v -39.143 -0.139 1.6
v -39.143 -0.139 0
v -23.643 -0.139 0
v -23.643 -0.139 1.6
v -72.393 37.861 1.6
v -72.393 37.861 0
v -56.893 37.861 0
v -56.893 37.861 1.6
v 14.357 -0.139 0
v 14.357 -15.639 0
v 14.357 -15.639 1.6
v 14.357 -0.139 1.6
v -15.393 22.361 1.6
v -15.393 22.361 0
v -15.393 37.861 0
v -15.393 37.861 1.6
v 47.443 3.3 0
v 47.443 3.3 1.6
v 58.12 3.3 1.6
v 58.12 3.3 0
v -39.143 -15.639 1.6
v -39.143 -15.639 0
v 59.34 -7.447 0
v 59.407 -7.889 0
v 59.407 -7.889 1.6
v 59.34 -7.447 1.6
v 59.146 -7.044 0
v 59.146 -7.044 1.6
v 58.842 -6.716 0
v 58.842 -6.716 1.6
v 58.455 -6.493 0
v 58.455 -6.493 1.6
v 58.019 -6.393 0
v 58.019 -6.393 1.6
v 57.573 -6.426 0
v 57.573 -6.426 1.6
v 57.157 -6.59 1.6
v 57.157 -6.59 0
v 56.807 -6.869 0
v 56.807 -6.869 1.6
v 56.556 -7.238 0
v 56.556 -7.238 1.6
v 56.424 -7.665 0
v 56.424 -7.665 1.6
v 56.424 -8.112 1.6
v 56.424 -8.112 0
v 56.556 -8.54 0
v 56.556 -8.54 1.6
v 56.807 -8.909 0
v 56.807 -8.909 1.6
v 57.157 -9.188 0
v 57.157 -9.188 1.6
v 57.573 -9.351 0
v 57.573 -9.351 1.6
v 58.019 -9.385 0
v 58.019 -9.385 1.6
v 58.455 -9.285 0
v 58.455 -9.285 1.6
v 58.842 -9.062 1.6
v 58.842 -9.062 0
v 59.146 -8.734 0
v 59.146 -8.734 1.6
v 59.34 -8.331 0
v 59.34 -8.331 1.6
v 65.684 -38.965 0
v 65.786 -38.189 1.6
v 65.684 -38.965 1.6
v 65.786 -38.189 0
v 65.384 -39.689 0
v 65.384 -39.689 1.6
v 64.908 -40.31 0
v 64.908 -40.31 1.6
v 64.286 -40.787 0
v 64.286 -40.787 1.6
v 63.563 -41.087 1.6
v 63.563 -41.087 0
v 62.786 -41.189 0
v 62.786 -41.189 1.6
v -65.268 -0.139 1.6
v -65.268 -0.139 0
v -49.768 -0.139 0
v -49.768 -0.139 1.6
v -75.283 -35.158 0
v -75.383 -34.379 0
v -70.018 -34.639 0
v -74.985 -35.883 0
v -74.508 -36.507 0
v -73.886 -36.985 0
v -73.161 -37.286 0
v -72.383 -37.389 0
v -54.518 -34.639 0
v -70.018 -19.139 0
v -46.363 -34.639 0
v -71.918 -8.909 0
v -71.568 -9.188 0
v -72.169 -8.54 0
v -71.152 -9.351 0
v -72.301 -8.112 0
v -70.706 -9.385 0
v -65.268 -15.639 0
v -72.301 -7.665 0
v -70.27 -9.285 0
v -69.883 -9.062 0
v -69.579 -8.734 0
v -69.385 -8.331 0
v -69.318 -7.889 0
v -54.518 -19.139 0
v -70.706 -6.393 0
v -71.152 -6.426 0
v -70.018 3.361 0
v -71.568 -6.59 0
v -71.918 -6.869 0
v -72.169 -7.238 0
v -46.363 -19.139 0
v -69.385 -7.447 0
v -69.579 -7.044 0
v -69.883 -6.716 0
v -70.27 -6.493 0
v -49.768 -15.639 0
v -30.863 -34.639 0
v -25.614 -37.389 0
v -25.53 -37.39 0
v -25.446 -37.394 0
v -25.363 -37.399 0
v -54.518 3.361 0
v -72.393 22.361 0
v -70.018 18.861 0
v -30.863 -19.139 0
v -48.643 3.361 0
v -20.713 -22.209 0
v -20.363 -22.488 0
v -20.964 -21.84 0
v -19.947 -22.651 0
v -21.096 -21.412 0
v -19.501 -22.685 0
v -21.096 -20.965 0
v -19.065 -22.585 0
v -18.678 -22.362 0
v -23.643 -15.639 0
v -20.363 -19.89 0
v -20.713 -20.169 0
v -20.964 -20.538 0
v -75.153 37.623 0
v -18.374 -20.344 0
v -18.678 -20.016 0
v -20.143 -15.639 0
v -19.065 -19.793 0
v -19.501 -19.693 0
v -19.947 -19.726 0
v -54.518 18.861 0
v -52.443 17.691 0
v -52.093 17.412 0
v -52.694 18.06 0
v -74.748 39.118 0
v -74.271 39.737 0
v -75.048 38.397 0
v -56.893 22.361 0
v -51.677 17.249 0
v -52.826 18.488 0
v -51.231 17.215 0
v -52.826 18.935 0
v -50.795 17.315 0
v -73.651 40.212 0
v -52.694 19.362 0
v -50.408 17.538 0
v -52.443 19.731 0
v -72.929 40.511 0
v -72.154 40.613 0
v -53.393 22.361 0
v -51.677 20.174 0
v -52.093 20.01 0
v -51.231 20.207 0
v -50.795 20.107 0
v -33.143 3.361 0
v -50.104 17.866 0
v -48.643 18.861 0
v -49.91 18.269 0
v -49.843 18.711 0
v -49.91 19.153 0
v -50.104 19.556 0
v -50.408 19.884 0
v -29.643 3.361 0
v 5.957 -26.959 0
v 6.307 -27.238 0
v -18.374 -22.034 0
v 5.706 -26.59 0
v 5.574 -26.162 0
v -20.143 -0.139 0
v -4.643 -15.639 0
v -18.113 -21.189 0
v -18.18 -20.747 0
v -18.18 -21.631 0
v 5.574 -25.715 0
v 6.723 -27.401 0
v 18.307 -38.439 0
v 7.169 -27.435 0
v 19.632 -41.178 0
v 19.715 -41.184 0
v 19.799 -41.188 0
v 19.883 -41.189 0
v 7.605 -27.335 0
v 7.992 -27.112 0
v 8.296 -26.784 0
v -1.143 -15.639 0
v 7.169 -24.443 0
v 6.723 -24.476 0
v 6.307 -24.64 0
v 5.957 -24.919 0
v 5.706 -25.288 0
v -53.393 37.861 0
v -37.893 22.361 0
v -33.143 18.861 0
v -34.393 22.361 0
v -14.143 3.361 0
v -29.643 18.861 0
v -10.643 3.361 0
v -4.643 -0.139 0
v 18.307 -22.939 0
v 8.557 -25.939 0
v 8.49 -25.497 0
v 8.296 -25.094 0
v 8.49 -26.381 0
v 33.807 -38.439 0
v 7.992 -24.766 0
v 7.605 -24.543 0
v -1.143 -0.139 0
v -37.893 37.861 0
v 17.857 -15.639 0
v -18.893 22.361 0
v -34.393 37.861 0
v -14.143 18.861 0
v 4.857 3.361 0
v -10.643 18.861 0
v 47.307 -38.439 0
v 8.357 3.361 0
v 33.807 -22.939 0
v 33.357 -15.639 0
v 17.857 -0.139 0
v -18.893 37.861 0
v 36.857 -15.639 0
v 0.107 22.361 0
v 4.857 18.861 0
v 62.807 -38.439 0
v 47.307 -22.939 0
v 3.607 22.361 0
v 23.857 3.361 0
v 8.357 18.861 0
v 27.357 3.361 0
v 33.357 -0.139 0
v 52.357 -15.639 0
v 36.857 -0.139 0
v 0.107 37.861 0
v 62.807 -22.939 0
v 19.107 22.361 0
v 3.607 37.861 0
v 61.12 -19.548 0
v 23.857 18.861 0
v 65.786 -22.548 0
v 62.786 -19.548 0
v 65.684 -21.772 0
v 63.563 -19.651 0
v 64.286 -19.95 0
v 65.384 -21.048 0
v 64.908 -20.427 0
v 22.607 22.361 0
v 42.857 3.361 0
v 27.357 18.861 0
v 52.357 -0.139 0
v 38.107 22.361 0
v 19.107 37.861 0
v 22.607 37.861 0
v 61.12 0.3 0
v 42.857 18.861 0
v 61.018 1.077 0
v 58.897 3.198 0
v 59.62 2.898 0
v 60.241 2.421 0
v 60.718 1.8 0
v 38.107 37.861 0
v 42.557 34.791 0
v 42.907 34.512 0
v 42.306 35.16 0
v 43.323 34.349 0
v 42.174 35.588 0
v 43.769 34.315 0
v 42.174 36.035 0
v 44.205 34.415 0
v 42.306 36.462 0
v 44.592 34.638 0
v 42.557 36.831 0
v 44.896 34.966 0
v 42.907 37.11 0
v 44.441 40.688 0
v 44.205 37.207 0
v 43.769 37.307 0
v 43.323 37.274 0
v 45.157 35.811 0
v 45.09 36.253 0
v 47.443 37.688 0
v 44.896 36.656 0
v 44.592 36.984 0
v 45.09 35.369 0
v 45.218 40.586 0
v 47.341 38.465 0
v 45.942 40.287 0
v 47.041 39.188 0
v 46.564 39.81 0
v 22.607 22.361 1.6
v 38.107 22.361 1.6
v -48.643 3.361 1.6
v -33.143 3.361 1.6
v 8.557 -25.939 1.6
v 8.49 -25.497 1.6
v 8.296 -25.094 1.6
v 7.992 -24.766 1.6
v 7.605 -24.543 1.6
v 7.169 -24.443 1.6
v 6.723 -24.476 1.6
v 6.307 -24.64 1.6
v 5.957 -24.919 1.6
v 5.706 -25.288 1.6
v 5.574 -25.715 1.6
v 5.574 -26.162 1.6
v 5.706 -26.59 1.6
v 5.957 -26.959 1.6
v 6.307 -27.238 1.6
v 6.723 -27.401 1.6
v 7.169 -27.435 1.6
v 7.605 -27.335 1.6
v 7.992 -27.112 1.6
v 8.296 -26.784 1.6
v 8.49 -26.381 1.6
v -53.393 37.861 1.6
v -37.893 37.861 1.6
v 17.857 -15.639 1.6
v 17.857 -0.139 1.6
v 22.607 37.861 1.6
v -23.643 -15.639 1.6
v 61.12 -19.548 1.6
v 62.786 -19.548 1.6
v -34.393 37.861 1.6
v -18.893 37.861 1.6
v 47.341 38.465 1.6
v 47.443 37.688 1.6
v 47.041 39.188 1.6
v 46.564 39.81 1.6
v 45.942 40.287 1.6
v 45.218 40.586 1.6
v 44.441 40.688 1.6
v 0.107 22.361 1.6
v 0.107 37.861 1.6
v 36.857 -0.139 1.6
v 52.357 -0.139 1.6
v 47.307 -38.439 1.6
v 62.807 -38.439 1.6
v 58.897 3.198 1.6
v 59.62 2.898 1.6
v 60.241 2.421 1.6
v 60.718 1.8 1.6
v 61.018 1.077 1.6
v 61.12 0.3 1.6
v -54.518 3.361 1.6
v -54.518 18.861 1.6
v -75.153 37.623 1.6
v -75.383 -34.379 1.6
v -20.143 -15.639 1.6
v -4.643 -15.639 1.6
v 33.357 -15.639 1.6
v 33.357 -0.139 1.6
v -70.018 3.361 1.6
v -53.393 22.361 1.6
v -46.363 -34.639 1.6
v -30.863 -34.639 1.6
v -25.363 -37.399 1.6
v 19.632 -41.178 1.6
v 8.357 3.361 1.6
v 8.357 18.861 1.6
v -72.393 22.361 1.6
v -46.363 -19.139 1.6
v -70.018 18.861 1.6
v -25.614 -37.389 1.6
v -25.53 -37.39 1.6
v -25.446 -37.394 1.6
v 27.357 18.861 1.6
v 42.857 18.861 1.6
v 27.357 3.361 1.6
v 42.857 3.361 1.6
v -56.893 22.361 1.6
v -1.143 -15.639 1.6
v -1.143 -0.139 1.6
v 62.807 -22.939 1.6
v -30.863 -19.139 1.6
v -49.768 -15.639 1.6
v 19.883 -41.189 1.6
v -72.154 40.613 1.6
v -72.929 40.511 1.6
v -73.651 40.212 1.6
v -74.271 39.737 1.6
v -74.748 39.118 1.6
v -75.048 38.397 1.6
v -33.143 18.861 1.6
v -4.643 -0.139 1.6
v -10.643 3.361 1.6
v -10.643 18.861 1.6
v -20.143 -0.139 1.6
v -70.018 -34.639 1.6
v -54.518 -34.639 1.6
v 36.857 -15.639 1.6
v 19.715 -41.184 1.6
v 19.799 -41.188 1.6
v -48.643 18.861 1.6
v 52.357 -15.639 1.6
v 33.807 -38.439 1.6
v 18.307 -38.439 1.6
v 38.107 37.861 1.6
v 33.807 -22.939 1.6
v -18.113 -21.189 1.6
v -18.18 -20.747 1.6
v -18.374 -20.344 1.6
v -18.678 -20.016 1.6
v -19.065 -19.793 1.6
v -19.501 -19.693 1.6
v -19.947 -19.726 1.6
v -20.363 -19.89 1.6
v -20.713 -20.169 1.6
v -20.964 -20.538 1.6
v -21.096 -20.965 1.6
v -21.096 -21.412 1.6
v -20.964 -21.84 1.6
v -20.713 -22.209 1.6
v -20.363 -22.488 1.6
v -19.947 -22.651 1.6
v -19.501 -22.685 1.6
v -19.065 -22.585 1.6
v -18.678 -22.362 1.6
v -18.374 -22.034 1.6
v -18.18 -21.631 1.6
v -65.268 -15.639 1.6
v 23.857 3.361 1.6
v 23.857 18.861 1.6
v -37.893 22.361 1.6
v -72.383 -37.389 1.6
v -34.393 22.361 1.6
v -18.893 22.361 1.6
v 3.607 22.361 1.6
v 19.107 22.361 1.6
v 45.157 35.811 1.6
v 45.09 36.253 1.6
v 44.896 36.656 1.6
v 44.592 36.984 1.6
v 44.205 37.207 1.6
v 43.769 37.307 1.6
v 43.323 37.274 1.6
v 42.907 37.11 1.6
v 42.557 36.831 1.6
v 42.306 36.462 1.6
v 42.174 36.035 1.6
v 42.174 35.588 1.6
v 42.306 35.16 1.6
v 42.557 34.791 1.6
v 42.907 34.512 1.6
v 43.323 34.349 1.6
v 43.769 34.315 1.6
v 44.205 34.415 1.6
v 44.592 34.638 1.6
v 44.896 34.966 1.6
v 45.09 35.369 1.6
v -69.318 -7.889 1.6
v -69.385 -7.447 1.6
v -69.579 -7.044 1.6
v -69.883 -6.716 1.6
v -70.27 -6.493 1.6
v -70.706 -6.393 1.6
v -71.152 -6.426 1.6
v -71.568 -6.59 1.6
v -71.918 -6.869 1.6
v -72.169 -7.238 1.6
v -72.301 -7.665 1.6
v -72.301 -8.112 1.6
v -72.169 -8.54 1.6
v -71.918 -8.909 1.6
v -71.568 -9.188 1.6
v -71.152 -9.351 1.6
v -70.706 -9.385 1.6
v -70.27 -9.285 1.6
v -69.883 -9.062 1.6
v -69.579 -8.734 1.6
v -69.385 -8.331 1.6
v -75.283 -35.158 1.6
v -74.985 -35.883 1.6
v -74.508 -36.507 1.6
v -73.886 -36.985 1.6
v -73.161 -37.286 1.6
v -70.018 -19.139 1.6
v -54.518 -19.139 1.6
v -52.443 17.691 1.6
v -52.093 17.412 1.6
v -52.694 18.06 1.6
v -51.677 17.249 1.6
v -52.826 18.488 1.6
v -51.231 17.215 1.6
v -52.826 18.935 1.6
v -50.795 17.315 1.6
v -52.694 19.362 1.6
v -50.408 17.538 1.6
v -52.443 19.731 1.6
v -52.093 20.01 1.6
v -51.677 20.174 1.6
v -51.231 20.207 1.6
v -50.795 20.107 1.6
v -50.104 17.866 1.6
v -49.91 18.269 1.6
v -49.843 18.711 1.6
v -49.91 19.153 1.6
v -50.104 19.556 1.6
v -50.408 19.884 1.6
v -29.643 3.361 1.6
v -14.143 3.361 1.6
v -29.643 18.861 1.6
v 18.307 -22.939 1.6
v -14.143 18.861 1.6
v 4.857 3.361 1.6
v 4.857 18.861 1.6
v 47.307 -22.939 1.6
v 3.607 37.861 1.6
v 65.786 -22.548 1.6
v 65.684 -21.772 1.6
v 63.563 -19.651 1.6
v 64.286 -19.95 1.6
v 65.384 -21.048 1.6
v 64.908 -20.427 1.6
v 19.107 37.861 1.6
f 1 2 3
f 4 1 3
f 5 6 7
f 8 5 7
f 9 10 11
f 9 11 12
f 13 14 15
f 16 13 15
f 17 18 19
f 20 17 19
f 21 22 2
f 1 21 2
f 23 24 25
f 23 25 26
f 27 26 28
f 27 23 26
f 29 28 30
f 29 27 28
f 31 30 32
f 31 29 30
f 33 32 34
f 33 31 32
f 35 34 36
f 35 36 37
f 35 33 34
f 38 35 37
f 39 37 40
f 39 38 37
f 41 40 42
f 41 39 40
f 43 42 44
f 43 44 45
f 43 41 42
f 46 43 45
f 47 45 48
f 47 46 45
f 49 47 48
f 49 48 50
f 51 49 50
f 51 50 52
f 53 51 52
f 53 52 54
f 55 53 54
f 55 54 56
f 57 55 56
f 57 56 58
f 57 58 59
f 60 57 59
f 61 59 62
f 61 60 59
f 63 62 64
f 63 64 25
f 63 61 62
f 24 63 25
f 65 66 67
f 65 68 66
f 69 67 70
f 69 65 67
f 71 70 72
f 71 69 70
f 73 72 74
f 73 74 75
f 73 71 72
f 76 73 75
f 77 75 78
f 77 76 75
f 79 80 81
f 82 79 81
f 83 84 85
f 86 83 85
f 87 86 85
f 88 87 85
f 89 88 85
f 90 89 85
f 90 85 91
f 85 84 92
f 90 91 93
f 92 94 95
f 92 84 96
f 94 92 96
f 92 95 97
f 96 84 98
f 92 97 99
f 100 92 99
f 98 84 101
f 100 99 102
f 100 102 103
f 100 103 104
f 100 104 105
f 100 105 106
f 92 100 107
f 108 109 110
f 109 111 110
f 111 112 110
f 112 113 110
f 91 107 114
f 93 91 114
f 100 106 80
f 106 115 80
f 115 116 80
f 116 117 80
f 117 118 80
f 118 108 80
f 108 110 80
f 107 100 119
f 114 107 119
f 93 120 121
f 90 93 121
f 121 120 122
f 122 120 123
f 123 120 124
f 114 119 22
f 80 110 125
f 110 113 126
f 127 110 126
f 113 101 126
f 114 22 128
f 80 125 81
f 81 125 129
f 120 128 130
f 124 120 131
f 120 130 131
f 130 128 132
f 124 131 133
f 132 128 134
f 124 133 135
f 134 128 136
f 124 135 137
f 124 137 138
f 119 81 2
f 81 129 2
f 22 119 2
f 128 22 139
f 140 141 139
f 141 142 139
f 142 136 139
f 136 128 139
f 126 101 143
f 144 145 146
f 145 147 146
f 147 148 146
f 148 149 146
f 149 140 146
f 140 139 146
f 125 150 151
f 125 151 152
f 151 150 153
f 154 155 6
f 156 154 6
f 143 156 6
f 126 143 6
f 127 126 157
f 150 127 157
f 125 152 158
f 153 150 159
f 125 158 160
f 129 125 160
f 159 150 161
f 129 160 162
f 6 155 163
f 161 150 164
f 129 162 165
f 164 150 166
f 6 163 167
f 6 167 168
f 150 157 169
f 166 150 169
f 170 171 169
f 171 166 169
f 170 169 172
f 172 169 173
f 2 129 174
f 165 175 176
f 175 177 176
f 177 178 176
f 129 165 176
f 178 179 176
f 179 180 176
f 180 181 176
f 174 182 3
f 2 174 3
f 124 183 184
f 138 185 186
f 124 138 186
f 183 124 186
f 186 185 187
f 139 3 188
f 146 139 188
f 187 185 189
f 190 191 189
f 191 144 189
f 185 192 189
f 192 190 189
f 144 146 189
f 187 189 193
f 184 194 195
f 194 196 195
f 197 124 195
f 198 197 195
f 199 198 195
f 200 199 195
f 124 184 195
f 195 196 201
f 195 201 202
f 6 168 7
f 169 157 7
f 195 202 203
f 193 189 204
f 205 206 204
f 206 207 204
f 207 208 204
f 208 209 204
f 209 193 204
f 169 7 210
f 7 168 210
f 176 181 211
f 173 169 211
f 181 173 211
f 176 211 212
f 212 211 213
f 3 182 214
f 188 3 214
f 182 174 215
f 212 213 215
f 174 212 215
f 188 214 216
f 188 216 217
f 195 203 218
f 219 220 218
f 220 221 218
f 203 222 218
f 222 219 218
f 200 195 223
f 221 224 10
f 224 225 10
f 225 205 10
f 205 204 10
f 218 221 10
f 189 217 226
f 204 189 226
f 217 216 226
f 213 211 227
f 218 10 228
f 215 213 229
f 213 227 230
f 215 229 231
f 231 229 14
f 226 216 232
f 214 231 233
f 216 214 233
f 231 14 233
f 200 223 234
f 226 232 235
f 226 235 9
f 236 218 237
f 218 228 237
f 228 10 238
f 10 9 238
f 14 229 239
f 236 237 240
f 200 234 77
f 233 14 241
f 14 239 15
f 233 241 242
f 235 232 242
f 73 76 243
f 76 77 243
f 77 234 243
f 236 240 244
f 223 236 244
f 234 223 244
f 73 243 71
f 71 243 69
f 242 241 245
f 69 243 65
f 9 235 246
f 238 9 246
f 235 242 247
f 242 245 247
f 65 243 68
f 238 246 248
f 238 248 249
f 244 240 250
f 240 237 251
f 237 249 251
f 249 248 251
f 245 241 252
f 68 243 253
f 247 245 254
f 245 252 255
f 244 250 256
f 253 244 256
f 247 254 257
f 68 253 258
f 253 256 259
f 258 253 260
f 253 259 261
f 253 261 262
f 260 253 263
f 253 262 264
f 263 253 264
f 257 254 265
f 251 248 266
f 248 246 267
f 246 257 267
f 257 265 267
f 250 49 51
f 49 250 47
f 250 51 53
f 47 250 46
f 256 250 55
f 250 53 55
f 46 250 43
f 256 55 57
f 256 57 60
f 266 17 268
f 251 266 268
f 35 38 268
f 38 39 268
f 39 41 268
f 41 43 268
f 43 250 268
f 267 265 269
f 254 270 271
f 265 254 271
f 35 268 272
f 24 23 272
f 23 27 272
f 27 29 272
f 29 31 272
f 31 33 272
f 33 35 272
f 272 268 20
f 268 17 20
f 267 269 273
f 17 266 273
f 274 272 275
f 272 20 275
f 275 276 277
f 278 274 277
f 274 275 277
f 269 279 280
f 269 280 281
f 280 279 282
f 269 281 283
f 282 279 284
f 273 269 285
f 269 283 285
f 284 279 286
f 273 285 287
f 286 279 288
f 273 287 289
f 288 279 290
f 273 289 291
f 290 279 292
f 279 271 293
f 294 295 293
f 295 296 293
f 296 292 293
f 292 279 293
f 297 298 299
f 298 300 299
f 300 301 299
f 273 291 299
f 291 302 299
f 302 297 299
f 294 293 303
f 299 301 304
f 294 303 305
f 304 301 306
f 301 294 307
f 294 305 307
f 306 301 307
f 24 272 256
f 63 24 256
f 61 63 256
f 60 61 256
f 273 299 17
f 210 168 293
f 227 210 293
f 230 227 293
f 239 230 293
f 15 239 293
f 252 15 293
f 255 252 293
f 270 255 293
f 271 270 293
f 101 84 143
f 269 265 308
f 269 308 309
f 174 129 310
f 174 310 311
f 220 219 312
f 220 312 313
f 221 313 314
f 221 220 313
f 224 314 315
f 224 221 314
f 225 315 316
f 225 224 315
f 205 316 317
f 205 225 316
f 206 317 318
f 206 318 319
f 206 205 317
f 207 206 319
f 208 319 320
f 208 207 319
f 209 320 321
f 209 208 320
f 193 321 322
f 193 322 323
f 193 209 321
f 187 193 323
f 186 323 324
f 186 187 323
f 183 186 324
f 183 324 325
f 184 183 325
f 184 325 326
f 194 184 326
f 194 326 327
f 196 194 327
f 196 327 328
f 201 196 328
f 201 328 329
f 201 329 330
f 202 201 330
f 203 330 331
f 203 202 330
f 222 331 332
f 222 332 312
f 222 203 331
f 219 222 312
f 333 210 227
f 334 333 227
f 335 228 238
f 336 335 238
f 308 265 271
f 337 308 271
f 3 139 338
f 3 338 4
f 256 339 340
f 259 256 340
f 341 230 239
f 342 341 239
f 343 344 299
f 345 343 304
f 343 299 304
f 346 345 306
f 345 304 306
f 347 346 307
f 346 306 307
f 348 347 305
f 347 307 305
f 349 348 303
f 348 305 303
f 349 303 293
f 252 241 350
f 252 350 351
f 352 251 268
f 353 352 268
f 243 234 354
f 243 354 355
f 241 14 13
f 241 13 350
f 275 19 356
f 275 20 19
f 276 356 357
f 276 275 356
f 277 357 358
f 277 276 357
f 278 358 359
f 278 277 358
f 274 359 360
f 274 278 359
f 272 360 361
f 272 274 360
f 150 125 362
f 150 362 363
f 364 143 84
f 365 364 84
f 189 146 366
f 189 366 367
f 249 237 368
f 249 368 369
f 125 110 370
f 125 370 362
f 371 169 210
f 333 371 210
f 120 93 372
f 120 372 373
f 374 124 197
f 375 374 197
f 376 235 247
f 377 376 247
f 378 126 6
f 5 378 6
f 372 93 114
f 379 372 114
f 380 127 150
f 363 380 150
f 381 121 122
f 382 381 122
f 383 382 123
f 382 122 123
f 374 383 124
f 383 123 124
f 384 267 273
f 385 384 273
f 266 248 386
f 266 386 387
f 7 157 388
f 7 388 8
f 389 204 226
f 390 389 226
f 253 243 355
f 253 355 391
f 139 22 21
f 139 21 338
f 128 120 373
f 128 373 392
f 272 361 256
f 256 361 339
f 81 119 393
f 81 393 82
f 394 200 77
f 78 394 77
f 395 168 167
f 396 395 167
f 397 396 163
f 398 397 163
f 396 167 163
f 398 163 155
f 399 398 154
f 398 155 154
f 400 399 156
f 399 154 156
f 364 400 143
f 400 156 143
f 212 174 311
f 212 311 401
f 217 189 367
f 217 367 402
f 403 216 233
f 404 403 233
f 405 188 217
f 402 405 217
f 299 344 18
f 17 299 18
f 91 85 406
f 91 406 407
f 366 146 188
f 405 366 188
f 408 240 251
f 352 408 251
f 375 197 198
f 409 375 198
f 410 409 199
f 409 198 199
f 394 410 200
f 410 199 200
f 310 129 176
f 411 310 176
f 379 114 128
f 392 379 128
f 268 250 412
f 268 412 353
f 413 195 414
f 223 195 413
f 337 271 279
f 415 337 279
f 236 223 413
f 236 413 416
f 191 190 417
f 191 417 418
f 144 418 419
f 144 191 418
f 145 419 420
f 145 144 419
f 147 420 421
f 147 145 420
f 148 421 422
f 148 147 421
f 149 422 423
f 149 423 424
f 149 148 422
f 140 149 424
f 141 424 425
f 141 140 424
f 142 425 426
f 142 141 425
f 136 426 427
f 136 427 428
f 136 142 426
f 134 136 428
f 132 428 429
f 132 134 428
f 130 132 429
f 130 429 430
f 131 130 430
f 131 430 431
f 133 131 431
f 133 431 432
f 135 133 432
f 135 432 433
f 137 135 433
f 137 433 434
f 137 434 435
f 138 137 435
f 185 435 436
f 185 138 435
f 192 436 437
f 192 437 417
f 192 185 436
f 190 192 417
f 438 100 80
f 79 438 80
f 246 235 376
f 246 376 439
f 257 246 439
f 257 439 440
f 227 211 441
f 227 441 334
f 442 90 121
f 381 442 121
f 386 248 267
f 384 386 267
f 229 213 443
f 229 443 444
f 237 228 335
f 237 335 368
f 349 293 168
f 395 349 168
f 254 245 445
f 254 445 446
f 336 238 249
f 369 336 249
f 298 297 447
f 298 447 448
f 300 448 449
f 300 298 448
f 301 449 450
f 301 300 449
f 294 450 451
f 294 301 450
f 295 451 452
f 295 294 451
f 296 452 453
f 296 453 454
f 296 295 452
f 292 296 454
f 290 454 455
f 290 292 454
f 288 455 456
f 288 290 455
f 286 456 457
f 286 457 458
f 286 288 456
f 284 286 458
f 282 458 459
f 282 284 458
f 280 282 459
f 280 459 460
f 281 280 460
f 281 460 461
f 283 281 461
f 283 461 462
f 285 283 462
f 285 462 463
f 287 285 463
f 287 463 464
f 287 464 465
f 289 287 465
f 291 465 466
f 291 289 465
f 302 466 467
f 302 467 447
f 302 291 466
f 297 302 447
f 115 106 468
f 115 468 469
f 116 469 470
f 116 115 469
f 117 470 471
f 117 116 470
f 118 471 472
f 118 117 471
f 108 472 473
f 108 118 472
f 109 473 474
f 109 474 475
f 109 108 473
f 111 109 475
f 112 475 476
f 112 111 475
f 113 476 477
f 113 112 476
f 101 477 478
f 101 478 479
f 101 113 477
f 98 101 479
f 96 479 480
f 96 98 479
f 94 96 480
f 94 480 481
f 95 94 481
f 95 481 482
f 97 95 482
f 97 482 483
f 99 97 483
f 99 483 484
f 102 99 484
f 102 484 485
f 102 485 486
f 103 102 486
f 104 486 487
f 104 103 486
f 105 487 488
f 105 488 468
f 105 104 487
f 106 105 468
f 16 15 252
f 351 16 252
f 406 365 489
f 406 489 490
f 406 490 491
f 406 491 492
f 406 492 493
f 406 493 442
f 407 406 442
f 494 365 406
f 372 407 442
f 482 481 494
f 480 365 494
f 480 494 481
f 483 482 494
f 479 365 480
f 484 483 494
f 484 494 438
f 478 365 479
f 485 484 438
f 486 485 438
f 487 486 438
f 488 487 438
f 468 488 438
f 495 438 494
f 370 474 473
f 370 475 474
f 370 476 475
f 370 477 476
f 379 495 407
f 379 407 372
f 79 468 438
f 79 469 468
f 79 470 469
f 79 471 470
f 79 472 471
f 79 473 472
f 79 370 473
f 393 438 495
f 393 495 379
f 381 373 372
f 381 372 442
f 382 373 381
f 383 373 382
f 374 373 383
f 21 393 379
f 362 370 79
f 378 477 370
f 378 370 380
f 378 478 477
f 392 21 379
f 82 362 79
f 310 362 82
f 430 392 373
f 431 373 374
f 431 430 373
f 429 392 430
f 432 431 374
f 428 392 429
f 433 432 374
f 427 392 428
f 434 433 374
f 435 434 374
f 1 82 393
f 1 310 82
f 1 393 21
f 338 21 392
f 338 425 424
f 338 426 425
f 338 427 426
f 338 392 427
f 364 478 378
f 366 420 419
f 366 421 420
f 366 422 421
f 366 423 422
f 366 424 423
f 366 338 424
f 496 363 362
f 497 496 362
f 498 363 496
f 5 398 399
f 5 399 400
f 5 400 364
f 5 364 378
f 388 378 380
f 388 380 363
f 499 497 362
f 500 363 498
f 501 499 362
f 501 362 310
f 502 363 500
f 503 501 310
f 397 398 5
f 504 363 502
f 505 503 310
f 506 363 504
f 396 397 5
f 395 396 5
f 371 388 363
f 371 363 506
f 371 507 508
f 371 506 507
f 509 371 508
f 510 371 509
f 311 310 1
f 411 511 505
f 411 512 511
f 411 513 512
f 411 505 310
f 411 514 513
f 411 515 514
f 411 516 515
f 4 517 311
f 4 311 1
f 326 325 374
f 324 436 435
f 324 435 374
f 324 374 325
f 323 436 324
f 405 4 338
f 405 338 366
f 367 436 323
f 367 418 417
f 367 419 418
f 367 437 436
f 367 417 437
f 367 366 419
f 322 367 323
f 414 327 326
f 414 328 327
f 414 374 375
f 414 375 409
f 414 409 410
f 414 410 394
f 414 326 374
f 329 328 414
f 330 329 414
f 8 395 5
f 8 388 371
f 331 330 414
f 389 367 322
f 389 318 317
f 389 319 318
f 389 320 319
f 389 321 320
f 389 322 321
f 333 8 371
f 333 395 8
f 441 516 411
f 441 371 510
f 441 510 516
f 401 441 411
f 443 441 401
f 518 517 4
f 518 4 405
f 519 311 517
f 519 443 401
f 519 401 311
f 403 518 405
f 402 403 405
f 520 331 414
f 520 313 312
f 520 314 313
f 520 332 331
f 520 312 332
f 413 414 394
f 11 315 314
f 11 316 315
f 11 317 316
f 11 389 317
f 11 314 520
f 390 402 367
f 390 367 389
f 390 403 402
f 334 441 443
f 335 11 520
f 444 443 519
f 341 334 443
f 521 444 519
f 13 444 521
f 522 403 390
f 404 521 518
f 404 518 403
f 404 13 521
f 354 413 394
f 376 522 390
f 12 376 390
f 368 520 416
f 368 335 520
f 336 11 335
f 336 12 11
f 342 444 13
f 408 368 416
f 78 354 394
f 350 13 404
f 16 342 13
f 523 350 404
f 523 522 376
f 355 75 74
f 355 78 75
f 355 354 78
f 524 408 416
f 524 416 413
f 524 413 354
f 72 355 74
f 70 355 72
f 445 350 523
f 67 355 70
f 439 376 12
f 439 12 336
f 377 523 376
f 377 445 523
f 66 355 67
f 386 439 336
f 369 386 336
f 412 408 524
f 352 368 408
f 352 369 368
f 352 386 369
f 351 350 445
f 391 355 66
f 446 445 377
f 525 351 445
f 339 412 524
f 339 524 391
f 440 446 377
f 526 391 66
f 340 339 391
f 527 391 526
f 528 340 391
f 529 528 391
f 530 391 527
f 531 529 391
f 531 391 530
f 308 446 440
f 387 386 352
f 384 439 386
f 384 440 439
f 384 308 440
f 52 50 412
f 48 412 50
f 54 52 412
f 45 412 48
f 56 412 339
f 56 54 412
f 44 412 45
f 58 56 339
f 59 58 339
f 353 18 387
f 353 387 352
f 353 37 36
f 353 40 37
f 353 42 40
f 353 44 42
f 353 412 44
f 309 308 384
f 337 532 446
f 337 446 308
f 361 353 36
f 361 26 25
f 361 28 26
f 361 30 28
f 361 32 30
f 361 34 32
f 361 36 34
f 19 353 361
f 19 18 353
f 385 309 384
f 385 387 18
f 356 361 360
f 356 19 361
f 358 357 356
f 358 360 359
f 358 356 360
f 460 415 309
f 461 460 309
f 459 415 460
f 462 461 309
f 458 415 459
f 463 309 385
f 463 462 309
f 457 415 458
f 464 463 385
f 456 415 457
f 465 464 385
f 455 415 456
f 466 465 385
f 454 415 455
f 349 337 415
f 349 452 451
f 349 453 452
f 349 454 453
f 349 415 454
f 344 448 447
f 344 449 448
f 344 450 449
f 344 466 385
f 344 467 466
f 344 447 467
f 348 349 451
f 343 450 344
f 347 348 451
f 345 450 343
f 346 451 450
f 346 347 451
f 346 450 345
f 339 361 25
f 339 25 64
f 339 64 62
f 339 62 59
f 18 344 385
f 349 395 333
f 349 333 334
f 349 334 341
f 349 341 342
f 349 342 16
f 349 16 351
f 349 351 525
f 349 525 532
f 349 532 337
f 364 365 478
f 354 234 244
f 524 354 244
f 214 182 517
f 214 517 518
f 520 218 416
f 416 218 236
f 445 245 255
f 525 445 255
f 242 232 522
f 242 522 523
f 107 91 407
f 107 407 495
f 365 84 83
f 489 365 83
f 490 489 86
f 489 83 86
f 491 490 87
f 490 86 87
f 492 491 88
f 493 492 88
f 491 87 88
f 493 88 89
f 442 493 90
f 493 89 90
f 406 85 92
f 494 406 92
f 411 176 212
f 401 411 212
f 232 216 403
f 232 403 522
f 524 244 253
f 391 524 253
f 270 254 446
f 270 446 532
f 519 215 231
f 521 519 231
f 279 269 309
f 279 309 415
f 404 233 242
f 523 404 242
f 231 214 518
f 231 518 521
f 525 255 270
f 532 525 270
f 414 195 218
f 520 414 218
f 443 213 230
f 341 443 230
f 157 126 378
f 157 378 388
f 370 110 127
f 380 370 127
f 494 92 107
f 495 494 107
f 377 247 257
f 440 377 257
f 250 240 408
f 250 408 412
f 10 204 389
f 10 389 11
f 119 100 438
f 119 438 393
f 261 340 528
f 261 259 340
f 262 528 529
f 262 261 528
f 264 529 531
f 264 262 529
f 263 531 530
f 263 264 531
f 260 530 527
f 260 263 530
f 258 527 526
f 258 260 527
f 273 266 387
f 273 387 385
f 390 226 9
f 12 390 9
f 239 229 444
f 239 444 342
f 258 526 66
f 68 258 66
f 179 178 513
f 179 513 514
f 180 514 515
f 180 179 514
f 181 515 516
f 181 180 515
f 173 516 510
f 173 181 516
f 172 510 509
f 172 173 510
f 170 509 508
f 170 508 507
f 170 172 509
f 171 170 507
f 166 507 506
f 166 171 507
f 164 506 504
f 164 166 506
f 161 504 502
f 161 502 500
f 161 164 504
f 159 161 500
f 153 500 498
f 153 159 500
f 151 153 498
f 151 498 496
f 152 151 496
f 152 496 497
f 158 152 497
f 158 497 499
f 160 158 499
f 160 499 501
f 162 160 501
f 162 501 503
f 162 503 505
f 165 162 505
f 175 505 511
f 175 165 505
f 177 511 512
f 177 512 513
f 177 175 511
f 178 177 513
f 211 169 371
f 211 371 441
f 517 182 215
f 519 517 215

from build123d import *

# Parameters (mm, degrees)
SKETCH1_R           = 1.5
SKETCH1_W           = 15.5
SKETCH1_H           = 15.5
BOSS_EXTRUDE1_DEPTH = 1.6
CUT_EXTRUDE2_DEPTH  = 91.713045172
FILLET2_R           = 3
FILLET3_R           = 3


with BuildPart() as part:
    # Sketch1 → Boss-Extrude1 (new body)
    with BuildSketch(Plane.XY):
        with BuildLine():
            Line((80.807032999, -9.202000204), (80.807032999, 37.709242496))
            ThreePointArc((80.807032999, 37.709242496), (79.927673142, 39.831242844), (77.805109389, 40.709241907))
            Line((77.805109389, 40.709241907), (-72.154484411, 40.613083107))
            ThreePointArc((-72.154484411, 40.613083107), (-74.271159988, 39.737121752), (-75.152545414, 37.622699011))
            Line((-75.152545414, 37.622699011), (-75.383320814, -34.379217889))
            ThreePointArc((-75.383320814, -34.379217889), (-74.508053368, -36.506751286), (-72.383336219, -37.388833194))
            Line((-72.383336219, -37.388833194), (-25.613726719, -37.388833194))
            ThreePointArc((-25.613726719, -37.388833194), (-25.488077715, -37.391465627), (-25.362649219, -37.399358309))
            Line((-25.362649219, -37.399358309), (19.631715181, -41.178308109))
            ThreePointArc((19.631715181, -41.178308109), (19.757143676, -41.18620079), (19.88279268, -41.188833223))
            Line((19.88279268, -41.188833223), (68.14475528, -41.188833223))
            ThreePointArc((68.14475528, -41.188833223), (69.898886106, -40.622559803), (70.990805162, -39.137516598))
            Line((70.990805162, -39.137516598), (80.653082862, -10.150683598))
            ThreePointArc((80.653082862, -10.150683598), (80.768295364, -9.682546983), (80.807032999, -9.202000204))
        make_face()
        with Locations((-19.612967014, -21.188833189)):
            Circle(SKETCH1_R, mode=Mode.SUBTRACT)
        with Locations((7.057032986, -25.938833189)):
            Circle(SKETCH1_R, mode=Mode.SUBTRACT)
        with Locations((43.657032986, 35.811166811)):
            Circle(SKETCH1_R, mode=Mode.SUBTRACT)
        with Locations((-70.817967014, -7.888833189)):
            Circle(SKETCH1_R, mode=Mode.SUBTRACT)
        with Locations((57.907032986, -7.888833189)):
            Circle(SKETCH1_R, mode=Mode.SUBTRACT)
        with Locations((-51.342967014, 18.711166811)):
            Circle(SKETCH1_R, mode=Mode.SUBTRACT)
        with Locations((-64.642967014, 30.111166811)):
            Rectangle(SKETCH1_W, SKETCH1_H, mode=Mode.SUBTRACT)
        with Locations((-45.642967014, 30.111166811)):
            Rectangle(SKETCH1_W, SKETCH1_H, mode=Mode.SUBTRACT)
        with Locations((-26.642967014, 30.111166811)):
            Rectangle(SKETCH1_W, SKETCH1_H, mode=Mode.SUBTRACT)
        with Locations((-7.642967014, 30.111166811)):
            Rectangle(SKETCH1_W, SKETCH1_H, mode=Mode.SUBTRACT)
        with Locations((11.357032986, 30.111166811)):
            Rectangle(SKETCH1_W, SKETCH1_H, mode=Mode.SUBTRACT)
        with Locations((30.357032986, 30.111166811)):
            Rectangle(SKETCH1_W, SKETCH1_H, mode=Mode.SUBTRACT)
        with Locations((-62.267967014, 11.111166811)):
            Rectangle(SKETCH1_W, SKETCH1_H, mode=Mode.SUBTRACT)
        with Locations((-40.892967014, 11.111166811)):
            Rectangle(SKETCH1_W, SKETCH1_H, mode=Mode.SUBTRACT)
        with Locations((-21.892967014, 11.111166811)):
            Rectangle(SKETCH1_W, SKETCH1_H, mode=Mode.SUBTRACT)
        with Locations((-2.892967014, 11.111166811)):
            Rectangle(SKETCH1_W, SKETCH1_H, mode=Mode.SUBTRACT)
        with Locations((16.107032986, 11.111166811)):
            Rectangle(SKETCH1_W, SKETCH1_H, mode=Mode.SUBTRACT)
        with Locations((35.107032986, 11.111166811)):
            Rectangle(SKETCH1_W, SKETCH1_H, mode=Mode.SUBTRACT)
        with Locations((-57.517967014, -7.888833189)):
            Rectangle(SKETCH1_W, SKETCH1_H, mode=Mode.SUBTRACT)
        with Locations((-31.392967014, -7.888833189)):
            Rectangle(SKETCH1_W, SKETCH1_H, mode=Mode.SUBTRACT)
        with Locations((-12.392967014, -7.888833189)):
            Rectangle(SKETCH1_W, SKETCH1_H, mode=Mode.SUBTRACT)
        with Locations((6.607032986, -7.888833189)):
            Rectangle(SKETCH1_W, SKETCH1_H, mode=Mode.SUBTRACT)
        with Locations((25.607032986, -7.888833189)):
            Rectangle(SKETCH1_W, SKETCH1_H, mode=Mode.SUBTRACT)
        with Locations((44.607032986, -7.888833189)):
            Rectangle(SKETCH1_W, SKETCH1_H, mode=Mode.SUBTRACT)
        with Locations((-62.267967014, -26.888833189)):
            Rectangle(SKETCH1_W, SKETCH1_H, mode=Mode.SUBTRACT)
        with Locations((-38.612967014, -26.888833189)):
            Rectangle(SKETCH1_W, SKETCH1_H, mode=Mode.SUBTRACT)
        with Locations((26.057032986, -30.688833189)):
            Rectangle(SKETCH1_W, SKETCH1_H, mode=Mode.SUBTRACT)
        with Locations((55.057032986, -30.688833189)):
            Rectangle(SKETCH1_W, SKETCH1_H, mode=Mode.SUBTRACT)
    extrude(amount=BOSS_EXTRUDE1_DEPTH)

    # Sketch3 → Cut-Extrude2 (cut, through all)
    with BuildSketch(Plane.XY.offset(1.6)):
        Polygon((47.443249451, 42.560753869), (47.443249451, 3.300099698), (61.120116682, 3.300099698), (61.120116682, -19.548313794), (65.786341973, -19.548313794), (65.786341973, -41.188833223), (73.358886795, -43.51481274), (105.294000543, 60.45432308), align=None)
    extrude(amount=-CUT_EXTRUDE2_DEPTH, mode=Mode.SUBTRACT)

    # Fillet2
    fillet2_edges = [part.edges().sort_by_distance(p)[0] for p in [
        (47.443249451, 40.689772929, 0.8),
        (65.786341973, -19.548313794, 0.8),
        (61.120116682, 3.300099698, 0.8),
    ]]
    fillet(fillet2_edges, radius=FILLET2_R)

    # Fillet3
    fillet3_edges = [part.edges().sort_by_distance(p)[0] for p in [
        (65.786341973, -41.188833223, 0.8),
    ]]
    fillet(fillet3_edges, radius=FILLET3_R)


solid = part.part
